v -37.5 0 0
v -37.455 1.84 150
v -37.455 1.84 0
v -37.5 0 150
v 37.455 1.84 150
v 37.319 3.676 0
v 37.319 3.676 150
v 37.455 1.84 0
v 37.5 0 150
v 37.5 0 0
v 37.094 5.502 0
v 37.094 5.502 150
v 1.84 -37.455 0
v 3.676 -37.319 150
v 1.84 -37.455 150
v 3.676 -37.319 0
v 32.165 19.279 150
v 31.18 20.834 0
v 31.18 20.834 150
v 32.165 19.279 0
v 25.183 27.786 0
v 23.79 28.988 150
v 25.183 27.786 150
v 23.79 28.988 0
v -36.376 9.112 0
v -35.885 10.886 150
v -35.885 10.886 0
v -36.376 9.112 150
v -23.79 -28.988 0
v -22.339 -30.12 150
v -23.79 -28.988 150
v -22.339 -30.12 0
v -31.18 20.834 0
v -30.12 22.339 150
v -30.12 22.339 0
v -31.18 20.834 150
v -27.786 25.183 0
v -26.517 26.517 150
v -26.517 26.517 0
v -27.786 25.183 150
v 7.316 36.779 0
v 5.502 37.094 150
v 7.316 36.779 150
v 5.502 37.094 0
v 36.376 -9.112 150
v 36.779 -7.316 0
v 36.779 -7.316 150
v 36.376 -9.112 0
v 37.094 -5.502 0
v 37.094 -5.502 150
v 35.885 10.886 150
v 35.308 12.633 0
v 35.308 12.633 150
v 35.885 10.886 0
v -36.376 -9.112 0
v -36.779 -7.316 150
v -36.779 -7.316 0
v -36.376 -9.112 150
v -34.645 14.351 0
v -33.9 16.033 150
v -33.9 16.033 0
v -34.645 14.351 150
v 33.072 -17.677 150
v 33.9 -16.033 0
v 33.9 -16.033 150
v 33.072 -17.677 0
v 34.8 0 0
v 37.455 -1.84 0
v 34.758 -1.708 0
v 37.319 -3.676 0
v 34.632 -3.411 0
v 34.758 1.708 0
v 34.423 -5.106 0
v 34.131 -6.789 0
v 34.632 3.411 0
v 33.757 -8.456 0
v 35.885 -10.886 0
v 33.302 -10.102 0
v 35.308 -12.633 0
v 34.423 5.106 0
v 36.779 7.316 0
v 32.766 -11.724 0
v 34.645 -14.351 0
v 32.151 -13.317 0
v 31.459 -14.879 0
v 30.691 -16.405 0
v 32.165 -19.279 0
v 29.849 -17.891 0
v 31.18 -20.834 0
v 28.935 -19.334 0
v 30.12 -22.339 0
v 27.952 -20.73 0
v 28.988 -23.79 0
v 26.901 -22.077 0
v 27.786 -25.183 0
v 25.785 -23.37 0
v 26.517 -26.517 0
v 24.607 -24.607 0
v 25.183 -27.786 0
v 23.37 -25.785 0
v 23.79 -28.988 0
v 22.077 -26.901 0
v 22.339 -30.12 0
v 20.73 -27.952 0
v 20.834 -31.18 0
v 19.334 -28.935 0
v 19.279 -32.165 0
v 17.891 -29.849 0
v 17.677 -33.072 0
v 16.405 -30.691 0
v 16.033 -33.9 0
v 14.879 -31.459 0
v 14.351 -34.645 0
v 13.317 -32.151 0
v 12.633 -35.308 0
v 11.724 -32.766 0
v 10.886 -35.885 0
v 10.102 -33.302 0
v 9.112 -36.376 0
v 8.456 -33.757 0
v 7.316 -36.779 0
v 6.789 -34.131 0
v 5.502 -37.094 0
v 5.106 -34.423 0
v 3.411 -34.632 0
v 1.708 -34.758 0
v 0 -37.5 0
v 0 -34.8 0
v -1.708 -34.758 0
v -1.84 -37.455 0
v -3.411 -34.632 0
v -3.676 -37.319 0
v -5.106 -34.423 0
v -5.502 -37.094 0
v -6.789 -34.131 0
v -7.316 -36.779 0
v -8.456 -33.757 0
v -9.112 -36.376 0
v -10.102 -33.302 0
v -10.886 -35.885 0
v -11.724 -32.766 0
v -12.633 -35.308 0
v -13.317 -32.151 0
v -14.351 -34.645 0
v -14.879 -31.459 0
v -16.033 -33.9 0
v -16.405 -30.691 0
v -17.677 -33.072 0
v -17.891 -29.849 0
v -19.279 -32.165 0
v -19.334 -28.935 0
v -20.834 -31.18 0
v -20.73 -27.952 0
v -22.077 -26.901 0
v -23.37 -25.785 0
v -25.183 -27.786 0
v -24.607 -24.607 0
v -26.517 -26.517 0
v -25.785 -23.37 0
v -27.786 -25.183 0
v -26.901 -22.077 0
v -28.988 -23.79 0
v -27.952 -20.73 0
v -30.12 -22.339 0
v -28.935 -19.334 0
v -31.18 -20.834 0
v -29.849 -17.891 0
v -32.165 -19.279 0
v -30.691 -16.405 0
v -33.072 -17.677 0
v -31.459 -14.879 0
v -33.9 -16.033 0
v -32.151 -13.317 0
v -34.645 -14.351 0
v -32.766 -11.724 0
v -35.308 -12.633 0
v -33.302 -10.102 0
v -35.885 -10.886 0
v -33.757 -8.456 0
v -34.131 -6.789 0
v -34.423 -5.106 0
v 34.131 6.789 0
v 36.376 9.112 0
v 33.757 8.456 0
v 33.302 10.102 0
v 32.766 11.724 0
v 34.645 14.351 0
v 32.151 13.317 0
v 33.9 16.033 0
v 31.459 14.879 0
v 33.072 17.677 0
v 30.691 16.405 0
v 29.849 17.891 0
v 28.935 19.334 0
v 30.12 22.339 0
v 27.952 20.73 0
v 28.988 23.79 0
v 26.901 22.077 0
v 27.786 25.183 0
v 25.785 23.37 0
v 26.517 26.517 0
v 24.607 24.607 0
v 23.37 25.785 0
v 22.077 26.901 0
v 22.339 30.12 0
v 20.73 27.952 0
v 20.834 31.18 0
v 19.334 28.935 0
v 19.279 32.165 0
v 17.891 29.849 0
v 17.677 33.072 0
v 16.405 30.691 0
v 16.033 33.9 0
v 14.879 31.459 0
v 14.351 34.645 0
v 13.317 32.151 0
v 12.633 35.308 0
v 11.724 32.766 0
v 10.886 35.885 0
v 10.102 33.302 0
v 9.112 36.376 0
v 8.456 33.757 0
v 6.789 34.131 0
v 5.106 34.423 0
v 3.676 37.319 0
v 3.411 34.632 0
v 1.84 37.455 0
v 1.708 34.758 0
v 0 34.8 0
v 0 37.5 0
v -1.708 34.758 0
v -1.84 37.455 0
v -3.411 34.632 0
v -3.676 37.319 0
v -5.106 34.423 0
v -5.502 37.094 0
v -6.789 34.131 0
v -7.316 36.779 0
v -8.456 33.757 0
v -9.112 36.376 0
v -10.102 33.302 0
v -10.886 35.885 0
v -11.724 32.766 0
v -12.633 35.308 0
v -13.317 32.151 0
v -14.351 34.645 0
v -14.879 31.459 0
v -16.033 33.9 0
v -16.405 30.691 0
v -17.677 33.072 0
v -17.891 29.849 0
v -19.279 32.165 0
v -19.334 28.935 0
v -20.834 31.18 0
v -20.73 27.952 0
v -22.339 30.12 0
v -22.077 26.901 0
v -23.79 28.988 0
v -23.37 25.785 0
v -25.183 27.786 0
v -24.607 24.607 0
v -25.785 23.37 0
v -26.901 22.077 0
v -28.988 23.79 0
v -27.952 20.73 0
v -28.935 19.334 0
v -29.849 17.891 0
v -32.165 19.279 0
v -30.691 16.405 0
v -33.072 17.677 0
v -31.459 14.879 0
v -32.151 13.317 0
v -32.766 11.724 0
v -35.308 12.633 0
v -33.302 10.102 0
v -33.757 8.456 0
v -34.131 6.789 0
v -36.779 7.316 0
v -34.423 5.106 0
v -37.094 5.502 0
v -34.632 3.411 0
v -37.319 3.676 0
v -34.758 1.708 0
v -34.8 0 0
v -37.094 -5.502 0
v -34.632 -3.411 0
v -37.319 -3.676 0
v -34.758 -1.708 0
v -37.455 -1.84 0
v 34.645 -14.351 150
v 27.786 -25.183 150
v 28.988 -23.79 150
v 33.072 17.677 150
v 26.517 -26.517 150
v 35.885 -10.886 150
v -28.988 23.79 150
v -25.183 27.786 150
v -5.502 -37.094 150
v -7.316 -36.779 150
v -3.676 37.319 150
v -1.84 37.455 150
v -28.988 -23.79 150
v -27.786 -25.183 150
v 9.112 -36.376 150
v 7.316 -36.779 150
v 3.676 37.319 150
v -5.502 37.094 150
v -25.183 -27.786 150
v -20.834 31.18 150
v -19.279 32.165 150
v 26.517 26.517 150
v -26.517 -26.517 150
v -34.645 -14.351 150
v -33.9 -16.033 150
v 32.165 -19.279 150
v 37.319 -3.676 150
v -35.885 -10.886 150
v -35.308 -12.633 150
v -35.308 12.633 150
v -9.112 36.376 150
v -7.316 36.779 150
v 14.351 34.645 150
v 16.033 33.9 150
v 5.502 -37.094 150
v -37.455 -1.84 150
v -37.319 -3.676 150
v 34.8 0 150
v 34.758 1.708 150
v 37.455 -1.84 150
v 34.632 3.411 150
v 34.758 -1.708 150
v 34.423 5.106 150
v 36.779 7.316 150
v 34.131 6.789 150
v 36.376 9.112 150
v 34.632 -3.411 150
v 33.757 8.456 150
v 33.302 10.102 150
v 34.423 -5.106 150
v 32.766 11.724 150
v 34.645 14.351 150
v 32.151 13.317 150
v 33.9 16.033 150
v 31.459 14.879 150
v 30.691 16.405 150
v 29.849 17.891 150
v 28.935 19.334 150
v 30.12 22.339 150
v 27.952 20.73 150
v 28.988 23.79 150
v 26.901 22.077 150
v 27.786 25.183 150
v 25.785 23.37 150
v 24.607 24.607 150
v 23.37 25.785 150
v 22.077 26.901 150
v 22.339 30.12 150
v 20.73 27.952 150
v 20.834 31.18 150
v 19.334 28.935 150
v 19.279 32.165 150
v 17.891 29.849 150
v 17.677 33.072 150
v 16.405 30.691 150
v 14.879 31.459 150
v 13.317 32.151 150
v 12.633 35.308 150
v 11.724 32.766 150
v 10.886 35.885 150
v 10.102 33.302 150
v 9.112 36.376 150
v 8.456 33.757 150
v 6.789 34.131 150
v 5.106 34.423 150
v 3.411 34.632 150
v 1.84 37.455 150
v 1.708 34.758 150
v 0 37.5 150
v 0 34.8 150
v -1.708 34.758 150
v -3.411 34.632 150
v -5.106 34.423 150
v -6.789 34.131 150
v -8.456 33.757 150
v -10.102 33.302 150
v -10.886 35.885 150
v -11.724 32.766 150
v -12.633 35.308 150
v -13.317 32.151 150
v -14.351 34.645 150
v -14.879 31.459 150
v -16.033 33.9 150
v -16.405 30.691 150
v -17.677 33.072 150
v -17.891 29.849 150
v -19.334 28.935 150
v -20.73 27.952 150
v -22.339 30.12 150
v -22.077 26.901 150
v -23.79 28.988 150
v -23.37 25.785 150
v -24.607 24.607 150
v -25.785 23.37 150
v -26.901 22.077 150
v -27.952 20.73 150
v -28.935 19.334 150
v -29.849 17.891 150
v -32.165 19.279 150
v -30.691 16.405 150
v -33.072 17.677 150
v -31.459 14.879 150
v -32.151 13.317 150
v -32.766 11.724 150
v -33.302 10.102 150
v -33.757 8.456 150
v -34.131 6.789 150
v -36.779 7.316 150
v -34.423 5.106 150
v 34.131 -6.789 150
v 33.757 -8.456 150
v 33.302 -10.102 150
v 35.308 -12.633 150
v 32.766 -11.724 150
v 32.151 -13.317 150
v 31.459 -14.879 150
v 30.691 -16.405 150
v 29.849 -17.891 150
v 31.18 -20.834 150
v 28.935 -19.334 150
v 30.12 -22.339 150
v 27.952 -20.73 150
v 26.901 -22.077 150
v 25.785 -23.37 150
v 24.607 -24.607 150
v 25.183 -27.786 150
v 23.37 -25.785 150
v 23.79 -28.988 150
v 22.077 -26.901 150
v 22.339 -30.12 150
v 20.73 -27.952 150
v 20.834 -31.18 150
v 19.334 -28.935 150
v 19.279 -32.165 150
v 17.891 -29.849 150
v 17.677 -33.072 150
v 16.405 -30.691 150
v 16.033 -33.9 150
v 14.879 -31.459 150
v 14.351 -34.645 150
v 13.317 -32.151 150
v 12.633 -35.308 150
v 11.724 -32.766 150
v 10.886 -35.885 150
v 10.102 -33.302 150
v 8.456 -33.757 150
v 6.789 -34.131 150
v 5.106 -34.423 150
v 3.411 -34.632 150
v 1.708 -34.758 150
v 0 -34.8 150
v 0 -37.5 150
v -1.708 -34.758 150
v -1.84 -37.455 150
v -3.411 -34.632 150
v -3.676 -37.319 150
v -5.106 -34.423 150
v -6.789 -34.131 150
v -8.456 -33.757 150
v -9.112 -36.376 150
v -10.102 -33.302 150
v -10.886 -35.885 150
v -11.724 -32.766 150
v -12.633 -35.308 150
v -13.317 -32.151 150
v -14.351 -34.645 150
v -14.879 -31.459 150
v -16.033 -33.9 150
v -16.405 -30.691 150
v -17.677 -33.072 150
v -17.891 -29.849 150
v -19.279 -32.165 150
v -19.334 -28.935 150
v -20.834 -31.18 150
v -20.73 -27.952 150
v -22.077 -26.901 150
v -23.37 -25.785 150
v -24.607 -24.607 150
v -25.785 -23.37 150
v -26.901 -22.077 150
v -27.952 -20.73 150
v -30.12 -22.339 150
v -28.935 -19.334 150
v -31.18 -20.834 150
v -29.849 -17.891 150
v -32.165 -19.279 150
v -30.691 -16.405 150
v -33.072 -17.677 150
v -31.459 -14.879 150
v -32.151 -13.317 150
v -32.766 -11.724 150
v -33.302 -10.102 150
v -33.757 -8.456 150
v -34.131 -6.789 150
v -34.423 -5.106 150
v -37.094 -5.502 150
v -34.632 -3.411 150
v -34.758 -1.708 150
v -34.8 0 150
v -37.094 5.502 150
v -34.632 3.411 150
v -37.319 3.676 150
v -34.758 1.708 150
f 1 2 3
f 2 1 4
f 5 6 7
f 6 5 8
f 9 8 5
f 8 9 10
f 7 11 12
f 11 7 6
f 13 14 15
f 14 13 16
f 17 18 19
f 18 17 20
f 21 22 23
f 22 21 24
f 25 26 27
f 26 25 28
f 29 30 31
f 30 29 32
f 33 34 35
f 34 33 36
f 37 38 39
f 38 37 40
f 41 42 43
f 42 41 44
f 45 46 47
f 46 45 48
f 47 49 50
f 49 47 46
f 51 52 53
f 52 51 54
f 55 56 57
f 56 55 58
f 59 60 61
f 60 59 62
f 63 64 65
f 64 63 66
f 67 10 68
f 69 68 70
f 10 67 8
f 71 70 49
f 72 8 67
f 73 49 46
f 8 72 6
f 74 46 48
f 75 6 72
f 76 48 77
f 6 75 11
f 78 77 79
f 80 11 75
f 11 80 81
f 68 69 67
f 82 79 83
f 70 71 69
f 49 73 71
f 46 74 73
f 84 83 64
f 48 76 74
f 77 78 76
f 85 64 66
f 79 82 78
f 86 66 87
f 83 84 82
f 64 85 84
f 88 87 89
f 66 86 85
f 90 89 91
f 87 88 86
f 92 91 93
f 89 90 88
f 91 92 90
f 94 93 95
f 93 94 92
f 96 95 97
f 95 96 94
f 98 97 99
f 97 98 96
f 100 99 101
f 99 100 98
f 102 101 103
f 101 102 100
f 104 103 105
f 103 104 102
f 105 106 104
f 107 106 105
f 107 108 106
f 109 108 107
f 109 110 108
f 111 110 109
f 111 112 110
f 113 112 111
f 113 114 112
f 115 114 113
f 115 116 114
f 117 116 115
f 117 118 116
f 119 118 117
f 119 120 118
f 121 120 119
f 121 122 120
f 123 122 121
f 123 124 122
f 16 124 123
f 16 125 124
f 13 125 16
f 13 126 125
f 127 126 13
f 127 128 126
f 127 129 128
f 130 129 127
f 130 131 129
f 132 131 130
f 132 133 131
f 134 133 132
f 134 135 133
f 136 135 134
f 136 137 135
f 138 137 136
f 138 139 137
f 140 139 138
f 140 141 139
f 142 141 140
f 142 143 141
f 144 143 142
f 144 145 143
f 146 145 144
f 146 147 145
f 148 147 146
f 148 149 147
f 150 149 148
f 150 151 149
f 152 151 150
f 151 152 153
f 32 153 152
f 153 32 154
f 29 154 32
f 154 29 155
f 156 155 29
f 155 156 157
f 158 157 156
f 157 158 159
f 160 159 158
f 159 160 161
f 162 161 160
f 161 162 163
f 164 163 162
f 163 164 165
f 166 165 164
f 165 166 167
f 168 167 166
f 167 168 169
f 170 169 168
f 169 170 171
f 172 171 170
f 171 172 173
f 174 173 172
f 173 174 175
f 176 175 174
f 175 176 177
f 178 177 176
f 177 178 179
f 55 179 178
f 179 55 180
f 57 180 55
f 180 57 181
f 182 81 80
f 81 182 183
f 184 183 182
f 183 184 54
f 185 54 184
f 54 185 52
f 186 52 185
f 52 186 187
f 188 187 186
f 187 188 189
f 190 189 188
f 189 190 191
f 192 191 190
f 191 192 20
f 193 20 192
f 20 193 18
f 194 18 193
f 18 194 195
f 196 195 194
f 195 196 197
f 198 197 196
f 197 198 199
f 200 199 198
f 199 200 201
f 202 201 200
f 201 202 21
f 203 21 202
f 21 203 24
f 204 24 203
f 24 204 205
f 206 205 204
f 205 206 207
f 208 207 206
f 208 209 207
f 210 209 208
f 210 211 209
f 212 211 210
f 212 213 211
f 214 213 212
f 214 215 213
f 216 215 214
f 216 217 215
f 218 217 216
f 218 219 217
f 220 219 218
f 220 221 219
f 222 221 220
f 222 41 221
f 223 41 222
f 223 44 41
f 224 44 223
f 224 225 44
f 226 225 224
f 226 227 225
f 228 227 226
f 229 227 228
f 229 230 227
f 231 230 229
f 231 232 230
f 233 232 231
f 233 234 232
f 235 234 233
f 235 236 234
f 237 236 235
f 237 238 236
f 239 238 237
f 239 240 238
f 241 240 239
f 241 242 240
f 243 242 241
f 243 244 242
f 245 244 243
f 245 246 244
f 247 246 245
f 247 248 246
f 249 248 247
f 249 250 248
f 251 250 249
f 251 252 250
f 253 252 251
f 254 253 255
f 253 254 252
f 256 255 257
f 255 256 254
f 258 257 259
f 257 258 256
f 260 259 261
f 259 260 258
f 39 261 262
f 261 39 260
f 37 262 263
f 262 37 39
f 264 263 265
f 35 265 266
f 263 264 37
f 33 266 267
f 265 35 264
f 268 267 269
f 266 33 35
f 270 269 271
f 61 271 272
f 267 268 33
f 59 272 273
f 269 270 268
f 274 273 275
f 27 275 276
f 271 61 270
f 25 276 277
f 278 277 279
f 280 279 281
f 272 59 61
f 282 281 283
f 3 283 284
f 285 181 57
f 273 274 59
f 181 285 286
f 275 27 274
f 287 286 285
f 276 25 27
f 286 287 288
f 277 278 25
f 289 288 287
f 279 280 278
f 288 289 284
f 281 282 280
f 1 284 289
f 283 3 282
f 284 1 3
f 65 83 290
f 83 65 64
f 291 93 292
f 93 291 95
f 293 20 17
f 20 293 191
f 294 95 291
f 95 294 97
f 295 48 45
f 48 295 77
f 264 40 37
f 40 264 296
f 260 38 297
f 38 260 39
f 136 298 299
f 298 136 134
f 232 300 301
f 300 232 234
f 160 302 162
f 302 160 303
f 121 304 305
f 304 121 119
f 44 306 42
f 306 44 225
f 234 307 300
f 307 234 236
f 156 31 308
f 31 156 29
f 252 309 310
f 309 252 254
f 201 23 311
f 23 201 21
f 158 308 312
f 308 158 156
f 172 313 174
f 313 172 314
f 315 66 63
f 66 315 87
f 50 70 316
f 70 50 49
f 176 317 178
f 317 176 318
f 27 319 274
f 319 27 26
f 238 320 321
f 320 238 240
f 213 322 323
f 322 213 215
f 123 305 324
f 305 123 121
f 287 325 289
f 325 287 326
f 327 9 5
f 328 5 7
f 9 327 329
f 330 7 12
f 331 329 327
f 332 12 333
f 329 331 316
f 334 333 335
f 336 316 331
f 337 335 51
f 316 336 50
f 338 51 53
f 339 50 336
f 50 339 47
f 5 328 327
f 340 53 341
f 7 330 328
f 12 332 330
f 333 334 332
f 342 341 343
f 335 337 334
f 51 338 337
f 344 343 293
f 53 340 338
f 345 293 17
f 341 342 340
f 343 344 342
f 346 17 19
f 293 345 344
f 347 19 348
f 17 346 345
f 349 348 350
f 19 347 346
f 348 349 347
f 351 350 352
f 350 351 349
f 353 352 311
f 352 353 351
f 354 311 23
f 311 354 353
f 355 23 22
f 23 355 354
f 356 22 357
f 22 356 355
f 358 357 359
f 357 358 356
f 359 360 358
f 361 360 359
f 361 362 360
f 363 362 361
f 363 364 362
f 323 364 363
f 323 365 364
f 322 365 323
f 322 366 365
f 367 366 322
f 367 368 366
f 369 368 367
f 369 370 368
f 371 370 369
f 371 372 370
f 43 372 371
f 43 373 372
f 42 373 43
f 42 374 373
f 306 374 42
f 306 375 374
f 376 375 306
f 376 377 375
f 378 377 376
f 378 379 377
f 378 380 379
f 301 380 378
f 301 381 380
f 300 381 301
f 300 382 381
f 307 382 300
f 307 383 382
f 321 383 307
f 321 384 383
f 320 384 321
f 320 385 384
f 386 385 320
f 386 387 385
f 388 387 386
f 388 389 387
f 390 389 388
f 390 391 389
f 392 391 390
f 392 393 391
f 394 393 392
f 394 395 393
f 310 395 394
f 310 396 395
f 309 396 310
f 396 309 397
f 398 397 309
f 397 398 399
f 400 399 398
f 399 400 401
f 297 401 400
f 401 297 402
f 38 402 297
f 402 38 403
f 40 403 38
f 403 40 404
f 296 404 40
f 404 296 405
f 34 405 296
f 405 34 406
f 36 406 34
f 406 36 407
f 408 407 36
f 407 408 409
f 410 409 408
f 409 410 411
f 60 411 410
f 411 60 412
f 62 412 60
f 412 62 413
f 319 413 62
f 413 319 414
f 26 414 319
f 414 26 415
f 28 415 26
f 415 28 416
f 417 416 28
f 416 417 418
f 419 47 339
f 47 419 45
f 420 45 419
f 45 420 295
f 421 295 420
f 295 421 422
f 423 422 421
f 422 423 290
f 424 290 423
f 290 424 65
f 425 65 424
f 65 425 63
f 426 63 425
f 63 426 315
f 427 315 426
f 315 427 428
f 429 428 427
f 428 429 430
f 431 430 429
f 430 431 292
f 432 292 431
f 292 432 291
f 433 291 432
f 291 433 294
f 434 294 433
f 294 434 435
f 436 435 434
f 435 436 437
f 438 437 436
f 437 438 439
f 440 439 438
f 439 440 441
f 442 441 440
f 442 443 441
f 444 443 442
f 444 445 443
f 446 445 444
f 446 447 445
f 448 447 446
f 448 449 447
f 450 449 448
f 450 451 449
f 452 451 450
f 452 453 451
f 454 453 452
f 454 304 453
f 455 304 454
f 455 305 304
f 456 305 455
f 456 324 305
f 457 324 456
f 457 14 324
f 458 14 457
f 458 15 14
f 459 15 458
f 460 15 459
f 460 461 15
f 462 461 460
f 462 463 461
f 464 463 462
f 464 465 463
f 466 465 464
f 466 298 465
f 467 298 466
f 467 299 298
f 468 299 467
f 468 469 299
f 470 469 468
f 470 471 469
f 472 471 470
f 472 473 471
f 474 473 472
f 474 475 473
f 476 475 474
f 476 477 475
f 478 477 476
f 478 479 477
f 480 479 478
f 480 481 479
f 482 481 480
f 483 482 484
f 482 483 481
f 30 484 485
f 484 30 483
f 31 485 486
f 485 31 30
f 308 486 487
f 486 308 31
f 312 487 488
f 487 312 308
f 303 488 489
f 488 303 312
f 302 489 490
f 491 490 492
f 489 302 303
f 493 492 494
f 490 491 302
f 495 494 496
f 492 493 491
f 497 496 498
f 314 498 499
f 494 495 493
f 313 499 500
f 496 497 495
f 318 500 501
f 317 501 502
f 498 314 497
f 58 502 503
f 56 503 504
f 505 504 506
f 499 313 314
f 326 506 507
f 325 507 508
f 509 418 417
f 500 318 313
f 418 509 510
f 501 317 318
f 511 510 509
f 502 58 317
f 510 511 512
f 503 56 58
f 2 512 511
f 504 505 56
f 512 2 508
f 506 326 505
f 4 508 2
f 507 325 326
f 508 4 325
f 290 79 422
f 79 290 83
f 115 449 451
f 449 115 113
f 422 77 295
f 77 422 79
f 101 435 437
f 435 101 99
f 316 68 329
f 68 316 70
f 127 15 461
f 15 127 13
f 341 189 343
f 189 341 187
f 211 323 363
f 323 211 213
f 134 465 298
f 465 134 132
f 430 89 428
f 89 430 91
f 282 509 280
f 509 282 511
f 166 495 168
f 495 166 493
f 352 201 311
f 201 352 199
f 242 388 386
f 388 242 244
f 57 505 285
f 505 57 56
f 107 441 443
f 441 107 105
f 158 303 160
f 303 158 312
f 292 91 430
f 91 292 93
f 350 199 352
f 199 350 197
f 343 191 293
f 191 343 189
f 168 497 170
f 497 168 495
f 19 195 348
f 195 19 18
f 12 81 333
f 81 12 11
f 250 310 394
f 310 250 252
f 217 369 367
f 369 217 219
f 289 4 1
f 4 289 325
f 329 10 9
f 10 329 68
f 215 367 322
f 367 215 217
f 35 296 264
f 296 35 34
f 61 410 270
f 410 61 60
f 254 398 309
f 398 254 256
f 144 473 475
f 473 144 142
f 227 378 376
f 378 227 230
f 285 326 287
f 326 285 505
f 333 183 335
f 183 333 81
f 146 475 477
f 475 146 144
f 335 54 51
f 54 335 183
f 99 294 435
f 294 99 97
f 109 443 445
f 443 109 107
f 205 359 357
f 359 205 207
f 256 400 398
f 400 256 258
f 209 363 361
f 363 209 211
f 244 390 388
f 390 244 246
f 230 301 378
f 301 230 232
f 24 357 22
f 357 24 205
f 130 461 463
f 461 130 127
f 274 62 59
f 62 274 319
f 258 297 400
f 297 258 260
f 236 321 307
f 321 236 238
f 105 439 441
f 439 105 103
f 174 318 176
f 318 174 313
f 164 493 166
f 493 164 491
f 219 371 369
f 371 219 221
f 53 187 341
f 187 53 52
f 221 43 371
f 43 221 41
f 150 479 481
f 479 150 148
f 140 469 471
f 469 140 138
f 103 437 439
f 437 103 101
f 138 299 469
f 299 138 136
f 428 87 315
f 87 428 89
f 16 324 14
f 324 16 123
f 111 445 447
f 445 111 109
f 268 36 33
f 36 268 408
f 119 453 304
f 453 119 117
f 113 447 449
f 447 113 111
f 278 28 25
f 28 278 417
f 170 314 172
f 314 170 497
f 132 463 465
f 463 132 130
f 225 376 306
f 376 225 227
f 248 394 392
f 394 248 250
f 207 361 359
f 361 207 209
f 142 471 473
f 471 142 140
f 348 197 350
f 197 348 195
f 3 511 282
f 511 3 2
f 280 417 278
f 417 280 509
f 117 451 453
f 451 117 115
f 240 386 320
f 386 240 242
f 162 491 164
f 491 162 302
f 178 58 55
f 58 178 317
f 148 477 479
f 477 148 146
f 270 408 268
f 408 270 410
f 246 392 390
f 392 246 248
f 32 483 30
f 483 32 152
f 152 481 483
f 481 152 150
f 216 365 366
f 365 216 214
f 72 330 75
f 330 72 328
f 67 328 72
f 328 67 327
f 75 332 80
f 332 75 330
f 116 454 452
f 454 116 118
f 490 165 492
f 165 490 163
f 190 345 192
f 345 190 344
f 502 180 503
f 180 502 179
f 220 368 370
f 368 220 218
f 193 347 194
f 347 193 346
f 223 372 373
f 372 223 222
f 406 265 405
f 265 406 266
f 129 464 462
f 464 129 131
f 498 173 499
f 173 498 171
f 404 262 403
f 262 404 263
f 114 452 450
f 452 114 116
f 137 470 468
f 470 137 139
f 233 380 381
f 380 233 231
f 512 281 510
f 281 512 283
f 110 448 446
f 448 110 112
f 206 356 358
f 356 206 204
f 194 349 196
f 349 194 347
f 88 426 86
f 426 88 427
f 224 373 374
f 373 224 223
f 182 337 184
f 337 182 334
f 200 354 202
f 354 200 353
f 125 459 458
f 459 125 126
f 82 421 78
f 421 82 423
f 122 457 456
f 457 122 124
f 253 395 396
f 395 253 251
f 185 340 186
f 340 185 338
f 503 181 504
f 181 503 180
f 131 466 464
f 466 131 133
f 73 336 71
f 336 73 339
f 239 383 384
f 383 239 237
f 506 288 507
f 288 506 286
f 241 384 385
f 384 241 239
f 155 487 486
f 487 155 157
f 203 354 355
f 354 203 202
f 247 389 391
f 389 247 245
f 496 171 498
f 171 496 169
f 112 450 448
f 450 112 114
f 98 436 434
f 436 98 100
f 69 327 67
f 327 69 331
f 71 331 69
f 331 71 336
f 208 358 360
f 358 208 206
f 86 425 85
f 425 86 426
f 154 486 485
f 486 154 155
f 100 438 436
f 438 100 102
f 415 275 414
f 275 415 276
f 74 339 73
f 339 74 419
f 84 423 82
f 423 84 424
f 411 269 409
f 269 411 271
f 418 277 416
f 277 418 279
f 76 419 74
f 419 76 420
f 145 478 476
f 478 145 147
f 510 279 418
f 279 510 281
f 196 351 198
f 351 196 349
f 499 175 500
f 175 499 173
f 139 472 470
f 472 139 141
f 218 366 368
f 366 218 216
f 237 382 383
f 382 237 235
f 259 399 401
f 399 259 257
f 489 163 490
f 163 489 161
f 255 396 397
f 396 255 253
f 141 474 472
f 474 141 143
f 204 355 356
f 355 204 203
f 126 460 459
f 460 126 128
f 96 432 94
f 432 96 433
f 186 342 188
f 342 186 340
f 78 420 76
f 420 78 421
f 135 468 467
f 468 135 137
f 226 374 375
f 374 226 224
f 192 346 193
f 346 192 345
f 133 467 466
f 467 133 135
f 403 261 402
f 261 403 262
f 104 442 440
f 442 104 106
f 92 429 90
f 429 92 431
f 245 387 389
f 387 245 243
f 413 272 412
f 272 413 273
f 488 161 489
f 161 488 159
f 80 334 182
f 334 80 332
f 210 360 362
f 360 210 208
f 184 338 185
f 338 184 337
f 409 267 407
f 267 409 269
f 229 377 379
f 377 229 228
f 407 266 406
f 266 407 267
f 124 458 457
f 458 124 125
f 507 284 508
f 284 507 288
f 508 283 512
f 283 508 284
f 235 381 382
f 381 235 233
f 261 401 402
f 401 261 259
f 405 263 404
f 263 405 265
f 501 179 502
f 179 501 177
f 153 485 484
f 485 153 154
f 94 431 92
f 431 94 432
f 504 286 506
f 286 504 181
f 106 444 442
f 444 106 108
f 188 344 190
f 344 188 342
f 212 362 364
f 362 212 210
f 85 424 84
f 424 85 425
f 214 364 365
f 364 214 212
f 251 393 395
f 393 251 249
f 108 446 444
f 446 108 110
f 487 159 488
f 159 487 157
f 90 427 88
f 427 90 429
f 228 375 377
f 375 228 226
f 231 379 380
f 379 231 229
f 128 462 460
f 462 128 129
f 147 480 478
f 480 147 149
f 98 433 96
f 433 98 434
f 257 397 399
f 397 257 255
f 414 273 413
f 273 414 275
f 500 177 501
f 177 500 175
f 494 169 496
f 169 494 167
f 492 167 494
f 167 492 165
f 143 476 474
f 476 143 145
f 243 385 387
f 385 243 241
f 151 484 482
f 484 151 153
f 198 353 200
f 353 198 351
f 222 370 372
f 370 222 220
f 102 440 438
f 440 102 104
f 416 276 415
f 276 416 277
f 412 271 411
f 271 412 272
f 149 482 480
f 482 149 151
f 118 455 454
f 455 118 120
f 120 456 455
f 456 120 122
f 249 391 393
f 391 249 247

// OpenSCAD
$fn = 128;

// HT pipe: nominal DN75, length 150 mm
// Approximations (typical): OD 75 mm, wall 2.7 mm
dn = 75;
L  = 150;

od = 75;
wall = 2.7;
id = od - 2*wall;

module ht_pipe(od, id, L){
    difference(){
        cylinder(h=L, d=od);
        translate([0,0,-0.5])
            cylinder(h=L+1, d=id);
    }
}

ht_pipe(od=od, id=id, L=L);
